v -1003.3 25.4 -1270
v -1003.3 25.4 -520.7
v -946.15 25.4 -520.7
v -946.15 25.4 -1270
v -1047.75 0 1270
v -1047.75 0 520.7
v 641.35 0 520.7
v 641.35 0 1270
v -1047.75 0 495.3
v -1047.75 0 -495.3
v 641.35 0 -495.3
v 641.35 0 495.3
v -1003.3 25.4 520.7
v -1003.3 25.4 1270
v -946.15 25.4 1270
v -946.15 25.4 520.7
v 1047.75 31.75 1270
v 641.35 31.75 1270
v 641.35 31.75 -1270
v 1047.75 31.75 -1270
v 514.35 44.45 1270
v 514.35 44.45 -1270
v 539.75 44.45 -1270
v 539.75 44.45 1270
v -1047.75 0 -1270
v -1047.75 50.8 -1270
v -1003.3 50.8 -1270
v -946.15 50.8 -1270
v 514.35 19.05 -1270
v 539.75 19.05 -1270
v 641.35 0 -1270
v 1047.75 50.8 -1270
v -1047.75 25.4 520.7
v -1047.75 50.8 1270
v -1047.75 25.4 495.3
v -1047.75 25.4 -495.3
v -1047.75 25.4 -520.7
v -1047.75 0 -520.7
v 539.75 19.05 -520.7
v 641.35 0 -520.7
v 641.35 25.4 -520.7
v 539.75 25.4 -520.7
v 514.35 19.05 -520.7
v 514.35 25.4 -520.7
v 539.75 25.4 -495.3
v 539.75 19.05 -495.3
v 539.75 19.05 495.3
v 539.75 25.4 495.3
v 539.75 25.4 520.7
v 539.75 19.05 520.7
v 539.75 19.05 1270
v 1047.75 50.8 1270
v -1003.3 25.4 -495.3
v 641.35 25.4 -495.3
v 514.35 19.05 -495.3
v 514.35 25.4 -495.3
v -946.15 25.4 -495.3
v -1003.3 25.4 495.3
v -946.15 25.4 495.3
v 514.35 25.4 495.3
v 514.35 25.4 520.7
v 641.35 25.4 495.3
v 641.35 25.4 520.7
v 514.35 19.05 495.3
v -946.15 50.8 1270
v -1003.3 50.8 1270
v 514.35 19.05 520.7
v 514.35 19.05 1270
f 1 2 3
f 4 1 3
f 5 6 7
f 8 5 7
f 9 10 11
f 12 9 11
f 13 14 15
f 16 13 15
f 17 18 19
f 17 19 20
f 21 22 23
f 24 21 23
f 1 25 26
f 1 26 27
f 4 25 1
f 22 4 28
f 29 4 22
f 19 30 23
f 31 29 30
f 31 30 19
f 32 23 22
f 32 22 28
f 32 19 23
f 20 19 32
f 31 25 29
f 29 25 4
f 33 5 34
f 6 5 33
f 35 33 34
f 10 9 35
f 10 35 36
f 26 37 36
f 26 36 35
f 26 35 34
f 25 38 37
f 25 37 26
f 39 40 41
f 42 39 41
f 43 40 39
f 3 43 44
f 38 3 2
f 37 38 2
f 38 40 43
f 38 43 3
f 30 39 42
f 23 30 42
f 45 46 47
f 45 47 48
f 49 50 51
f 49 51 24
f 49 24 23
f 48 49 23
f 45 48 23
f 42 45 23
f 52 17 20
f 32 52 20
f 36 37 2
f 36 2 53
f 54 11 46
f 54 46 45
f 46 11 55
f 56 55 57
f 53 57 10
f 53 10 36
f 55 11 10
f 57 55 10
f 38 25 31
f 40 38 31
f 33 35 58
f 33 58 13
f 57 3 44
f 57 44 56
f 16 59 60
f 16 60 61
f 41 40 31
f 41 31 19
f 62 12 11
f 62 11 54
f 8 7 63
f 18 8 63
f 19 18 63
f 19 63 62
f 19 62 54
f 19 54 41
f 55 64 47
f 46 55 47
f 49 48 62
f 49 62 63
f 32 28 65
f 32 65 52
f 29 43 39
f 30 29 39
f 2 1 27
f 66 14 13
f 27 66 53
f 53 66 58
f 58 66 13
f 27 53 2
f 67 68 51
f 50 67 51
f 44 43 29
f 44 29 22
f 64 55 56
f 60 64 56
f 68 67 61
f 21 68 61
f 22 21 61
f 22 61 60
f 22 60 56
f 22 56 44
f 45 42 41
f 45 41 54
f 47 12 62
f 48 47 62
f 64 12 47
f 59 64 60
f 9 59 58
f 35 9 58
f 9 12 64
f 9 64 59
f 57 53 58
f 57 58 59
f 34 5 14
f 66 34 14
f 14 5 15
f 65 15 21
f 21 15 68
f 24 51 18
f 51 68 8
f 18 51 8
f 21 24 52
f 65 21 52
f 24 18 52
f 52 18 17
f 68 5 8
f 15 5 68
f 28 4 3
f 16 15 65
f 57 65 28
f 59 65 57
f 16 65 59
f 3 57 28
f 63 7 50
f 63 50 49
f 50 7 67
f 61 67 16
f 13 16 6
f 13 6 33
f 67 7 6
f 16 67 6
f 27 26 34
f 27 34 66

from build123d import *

# Parameters (mm, degrees)
SKETCH1_W           = 2095.5
SKETCH1_H           = 2540
BOSS_EXTRUDE1_DEPTH = 50.8
SKETCH2_W           = 57.15
SKETCH2_H           = 25.4
SKETCH2_W_2         = 406.4
SKETCH2_H_2         = 31.75
SKETCH2_W_3         = 25.4
CUT_EXTRUDE1_DEPTH  = 2540
SKETCH3_W           = 25.4
SKETCH3_H           = 25.4
CUT_EXTRUDE2_DEPTH  = 2095.5


with BuildPart() as part:
    # Sketch1 → Boss-Extrude1 (new body)
    with BuildSketch(Plane(origin=(0, 0, 0), x_dir=(1, 0, 0), z_dir=(0, 1, 0))):
        Rectangle(SKETCH1_W, SKETCH1_H)
    extrude(amount=BOSS_EXTRUDE1_DEPTH)

    # Sketch2 → Cut-Extrude1 (cut)
    with BuildSketch(Plane.XY.offset(1270)):
        with Locations((-974.725, 38.1)):
            Rectangle(SKETCH2_W, SKETCH2_H)
        with Locations((844.55, 15.875)):
            Rectangle(SKETCH2_W_2, SKETCH2_H_2)
        with Locations((527.05, 31.75)):
            Rectangle(SKETCH2_W_3, SKETCH2_H)
    extrude(amount=-CUT_EXTRUDE1_DEPTH, mode=Mode.SUBTRACT)

    # Sketch3 → Cut-Extrude2 (cut)
    with BuildSketch(Plane.ZY.offset(1047.75)):
        with Locations((-508, 12.7)):
            Rectangle(SKETCH3_W, SKETCH3_H)
        with Locations((508, 12.7)):
            Rectangle(SKETCH3_W, SKETCH3_H)
    extrude(amount=-CUT_EXTRUDE2_DEPTH, mode=Mode.SUBTRACT)


solid = part.part
